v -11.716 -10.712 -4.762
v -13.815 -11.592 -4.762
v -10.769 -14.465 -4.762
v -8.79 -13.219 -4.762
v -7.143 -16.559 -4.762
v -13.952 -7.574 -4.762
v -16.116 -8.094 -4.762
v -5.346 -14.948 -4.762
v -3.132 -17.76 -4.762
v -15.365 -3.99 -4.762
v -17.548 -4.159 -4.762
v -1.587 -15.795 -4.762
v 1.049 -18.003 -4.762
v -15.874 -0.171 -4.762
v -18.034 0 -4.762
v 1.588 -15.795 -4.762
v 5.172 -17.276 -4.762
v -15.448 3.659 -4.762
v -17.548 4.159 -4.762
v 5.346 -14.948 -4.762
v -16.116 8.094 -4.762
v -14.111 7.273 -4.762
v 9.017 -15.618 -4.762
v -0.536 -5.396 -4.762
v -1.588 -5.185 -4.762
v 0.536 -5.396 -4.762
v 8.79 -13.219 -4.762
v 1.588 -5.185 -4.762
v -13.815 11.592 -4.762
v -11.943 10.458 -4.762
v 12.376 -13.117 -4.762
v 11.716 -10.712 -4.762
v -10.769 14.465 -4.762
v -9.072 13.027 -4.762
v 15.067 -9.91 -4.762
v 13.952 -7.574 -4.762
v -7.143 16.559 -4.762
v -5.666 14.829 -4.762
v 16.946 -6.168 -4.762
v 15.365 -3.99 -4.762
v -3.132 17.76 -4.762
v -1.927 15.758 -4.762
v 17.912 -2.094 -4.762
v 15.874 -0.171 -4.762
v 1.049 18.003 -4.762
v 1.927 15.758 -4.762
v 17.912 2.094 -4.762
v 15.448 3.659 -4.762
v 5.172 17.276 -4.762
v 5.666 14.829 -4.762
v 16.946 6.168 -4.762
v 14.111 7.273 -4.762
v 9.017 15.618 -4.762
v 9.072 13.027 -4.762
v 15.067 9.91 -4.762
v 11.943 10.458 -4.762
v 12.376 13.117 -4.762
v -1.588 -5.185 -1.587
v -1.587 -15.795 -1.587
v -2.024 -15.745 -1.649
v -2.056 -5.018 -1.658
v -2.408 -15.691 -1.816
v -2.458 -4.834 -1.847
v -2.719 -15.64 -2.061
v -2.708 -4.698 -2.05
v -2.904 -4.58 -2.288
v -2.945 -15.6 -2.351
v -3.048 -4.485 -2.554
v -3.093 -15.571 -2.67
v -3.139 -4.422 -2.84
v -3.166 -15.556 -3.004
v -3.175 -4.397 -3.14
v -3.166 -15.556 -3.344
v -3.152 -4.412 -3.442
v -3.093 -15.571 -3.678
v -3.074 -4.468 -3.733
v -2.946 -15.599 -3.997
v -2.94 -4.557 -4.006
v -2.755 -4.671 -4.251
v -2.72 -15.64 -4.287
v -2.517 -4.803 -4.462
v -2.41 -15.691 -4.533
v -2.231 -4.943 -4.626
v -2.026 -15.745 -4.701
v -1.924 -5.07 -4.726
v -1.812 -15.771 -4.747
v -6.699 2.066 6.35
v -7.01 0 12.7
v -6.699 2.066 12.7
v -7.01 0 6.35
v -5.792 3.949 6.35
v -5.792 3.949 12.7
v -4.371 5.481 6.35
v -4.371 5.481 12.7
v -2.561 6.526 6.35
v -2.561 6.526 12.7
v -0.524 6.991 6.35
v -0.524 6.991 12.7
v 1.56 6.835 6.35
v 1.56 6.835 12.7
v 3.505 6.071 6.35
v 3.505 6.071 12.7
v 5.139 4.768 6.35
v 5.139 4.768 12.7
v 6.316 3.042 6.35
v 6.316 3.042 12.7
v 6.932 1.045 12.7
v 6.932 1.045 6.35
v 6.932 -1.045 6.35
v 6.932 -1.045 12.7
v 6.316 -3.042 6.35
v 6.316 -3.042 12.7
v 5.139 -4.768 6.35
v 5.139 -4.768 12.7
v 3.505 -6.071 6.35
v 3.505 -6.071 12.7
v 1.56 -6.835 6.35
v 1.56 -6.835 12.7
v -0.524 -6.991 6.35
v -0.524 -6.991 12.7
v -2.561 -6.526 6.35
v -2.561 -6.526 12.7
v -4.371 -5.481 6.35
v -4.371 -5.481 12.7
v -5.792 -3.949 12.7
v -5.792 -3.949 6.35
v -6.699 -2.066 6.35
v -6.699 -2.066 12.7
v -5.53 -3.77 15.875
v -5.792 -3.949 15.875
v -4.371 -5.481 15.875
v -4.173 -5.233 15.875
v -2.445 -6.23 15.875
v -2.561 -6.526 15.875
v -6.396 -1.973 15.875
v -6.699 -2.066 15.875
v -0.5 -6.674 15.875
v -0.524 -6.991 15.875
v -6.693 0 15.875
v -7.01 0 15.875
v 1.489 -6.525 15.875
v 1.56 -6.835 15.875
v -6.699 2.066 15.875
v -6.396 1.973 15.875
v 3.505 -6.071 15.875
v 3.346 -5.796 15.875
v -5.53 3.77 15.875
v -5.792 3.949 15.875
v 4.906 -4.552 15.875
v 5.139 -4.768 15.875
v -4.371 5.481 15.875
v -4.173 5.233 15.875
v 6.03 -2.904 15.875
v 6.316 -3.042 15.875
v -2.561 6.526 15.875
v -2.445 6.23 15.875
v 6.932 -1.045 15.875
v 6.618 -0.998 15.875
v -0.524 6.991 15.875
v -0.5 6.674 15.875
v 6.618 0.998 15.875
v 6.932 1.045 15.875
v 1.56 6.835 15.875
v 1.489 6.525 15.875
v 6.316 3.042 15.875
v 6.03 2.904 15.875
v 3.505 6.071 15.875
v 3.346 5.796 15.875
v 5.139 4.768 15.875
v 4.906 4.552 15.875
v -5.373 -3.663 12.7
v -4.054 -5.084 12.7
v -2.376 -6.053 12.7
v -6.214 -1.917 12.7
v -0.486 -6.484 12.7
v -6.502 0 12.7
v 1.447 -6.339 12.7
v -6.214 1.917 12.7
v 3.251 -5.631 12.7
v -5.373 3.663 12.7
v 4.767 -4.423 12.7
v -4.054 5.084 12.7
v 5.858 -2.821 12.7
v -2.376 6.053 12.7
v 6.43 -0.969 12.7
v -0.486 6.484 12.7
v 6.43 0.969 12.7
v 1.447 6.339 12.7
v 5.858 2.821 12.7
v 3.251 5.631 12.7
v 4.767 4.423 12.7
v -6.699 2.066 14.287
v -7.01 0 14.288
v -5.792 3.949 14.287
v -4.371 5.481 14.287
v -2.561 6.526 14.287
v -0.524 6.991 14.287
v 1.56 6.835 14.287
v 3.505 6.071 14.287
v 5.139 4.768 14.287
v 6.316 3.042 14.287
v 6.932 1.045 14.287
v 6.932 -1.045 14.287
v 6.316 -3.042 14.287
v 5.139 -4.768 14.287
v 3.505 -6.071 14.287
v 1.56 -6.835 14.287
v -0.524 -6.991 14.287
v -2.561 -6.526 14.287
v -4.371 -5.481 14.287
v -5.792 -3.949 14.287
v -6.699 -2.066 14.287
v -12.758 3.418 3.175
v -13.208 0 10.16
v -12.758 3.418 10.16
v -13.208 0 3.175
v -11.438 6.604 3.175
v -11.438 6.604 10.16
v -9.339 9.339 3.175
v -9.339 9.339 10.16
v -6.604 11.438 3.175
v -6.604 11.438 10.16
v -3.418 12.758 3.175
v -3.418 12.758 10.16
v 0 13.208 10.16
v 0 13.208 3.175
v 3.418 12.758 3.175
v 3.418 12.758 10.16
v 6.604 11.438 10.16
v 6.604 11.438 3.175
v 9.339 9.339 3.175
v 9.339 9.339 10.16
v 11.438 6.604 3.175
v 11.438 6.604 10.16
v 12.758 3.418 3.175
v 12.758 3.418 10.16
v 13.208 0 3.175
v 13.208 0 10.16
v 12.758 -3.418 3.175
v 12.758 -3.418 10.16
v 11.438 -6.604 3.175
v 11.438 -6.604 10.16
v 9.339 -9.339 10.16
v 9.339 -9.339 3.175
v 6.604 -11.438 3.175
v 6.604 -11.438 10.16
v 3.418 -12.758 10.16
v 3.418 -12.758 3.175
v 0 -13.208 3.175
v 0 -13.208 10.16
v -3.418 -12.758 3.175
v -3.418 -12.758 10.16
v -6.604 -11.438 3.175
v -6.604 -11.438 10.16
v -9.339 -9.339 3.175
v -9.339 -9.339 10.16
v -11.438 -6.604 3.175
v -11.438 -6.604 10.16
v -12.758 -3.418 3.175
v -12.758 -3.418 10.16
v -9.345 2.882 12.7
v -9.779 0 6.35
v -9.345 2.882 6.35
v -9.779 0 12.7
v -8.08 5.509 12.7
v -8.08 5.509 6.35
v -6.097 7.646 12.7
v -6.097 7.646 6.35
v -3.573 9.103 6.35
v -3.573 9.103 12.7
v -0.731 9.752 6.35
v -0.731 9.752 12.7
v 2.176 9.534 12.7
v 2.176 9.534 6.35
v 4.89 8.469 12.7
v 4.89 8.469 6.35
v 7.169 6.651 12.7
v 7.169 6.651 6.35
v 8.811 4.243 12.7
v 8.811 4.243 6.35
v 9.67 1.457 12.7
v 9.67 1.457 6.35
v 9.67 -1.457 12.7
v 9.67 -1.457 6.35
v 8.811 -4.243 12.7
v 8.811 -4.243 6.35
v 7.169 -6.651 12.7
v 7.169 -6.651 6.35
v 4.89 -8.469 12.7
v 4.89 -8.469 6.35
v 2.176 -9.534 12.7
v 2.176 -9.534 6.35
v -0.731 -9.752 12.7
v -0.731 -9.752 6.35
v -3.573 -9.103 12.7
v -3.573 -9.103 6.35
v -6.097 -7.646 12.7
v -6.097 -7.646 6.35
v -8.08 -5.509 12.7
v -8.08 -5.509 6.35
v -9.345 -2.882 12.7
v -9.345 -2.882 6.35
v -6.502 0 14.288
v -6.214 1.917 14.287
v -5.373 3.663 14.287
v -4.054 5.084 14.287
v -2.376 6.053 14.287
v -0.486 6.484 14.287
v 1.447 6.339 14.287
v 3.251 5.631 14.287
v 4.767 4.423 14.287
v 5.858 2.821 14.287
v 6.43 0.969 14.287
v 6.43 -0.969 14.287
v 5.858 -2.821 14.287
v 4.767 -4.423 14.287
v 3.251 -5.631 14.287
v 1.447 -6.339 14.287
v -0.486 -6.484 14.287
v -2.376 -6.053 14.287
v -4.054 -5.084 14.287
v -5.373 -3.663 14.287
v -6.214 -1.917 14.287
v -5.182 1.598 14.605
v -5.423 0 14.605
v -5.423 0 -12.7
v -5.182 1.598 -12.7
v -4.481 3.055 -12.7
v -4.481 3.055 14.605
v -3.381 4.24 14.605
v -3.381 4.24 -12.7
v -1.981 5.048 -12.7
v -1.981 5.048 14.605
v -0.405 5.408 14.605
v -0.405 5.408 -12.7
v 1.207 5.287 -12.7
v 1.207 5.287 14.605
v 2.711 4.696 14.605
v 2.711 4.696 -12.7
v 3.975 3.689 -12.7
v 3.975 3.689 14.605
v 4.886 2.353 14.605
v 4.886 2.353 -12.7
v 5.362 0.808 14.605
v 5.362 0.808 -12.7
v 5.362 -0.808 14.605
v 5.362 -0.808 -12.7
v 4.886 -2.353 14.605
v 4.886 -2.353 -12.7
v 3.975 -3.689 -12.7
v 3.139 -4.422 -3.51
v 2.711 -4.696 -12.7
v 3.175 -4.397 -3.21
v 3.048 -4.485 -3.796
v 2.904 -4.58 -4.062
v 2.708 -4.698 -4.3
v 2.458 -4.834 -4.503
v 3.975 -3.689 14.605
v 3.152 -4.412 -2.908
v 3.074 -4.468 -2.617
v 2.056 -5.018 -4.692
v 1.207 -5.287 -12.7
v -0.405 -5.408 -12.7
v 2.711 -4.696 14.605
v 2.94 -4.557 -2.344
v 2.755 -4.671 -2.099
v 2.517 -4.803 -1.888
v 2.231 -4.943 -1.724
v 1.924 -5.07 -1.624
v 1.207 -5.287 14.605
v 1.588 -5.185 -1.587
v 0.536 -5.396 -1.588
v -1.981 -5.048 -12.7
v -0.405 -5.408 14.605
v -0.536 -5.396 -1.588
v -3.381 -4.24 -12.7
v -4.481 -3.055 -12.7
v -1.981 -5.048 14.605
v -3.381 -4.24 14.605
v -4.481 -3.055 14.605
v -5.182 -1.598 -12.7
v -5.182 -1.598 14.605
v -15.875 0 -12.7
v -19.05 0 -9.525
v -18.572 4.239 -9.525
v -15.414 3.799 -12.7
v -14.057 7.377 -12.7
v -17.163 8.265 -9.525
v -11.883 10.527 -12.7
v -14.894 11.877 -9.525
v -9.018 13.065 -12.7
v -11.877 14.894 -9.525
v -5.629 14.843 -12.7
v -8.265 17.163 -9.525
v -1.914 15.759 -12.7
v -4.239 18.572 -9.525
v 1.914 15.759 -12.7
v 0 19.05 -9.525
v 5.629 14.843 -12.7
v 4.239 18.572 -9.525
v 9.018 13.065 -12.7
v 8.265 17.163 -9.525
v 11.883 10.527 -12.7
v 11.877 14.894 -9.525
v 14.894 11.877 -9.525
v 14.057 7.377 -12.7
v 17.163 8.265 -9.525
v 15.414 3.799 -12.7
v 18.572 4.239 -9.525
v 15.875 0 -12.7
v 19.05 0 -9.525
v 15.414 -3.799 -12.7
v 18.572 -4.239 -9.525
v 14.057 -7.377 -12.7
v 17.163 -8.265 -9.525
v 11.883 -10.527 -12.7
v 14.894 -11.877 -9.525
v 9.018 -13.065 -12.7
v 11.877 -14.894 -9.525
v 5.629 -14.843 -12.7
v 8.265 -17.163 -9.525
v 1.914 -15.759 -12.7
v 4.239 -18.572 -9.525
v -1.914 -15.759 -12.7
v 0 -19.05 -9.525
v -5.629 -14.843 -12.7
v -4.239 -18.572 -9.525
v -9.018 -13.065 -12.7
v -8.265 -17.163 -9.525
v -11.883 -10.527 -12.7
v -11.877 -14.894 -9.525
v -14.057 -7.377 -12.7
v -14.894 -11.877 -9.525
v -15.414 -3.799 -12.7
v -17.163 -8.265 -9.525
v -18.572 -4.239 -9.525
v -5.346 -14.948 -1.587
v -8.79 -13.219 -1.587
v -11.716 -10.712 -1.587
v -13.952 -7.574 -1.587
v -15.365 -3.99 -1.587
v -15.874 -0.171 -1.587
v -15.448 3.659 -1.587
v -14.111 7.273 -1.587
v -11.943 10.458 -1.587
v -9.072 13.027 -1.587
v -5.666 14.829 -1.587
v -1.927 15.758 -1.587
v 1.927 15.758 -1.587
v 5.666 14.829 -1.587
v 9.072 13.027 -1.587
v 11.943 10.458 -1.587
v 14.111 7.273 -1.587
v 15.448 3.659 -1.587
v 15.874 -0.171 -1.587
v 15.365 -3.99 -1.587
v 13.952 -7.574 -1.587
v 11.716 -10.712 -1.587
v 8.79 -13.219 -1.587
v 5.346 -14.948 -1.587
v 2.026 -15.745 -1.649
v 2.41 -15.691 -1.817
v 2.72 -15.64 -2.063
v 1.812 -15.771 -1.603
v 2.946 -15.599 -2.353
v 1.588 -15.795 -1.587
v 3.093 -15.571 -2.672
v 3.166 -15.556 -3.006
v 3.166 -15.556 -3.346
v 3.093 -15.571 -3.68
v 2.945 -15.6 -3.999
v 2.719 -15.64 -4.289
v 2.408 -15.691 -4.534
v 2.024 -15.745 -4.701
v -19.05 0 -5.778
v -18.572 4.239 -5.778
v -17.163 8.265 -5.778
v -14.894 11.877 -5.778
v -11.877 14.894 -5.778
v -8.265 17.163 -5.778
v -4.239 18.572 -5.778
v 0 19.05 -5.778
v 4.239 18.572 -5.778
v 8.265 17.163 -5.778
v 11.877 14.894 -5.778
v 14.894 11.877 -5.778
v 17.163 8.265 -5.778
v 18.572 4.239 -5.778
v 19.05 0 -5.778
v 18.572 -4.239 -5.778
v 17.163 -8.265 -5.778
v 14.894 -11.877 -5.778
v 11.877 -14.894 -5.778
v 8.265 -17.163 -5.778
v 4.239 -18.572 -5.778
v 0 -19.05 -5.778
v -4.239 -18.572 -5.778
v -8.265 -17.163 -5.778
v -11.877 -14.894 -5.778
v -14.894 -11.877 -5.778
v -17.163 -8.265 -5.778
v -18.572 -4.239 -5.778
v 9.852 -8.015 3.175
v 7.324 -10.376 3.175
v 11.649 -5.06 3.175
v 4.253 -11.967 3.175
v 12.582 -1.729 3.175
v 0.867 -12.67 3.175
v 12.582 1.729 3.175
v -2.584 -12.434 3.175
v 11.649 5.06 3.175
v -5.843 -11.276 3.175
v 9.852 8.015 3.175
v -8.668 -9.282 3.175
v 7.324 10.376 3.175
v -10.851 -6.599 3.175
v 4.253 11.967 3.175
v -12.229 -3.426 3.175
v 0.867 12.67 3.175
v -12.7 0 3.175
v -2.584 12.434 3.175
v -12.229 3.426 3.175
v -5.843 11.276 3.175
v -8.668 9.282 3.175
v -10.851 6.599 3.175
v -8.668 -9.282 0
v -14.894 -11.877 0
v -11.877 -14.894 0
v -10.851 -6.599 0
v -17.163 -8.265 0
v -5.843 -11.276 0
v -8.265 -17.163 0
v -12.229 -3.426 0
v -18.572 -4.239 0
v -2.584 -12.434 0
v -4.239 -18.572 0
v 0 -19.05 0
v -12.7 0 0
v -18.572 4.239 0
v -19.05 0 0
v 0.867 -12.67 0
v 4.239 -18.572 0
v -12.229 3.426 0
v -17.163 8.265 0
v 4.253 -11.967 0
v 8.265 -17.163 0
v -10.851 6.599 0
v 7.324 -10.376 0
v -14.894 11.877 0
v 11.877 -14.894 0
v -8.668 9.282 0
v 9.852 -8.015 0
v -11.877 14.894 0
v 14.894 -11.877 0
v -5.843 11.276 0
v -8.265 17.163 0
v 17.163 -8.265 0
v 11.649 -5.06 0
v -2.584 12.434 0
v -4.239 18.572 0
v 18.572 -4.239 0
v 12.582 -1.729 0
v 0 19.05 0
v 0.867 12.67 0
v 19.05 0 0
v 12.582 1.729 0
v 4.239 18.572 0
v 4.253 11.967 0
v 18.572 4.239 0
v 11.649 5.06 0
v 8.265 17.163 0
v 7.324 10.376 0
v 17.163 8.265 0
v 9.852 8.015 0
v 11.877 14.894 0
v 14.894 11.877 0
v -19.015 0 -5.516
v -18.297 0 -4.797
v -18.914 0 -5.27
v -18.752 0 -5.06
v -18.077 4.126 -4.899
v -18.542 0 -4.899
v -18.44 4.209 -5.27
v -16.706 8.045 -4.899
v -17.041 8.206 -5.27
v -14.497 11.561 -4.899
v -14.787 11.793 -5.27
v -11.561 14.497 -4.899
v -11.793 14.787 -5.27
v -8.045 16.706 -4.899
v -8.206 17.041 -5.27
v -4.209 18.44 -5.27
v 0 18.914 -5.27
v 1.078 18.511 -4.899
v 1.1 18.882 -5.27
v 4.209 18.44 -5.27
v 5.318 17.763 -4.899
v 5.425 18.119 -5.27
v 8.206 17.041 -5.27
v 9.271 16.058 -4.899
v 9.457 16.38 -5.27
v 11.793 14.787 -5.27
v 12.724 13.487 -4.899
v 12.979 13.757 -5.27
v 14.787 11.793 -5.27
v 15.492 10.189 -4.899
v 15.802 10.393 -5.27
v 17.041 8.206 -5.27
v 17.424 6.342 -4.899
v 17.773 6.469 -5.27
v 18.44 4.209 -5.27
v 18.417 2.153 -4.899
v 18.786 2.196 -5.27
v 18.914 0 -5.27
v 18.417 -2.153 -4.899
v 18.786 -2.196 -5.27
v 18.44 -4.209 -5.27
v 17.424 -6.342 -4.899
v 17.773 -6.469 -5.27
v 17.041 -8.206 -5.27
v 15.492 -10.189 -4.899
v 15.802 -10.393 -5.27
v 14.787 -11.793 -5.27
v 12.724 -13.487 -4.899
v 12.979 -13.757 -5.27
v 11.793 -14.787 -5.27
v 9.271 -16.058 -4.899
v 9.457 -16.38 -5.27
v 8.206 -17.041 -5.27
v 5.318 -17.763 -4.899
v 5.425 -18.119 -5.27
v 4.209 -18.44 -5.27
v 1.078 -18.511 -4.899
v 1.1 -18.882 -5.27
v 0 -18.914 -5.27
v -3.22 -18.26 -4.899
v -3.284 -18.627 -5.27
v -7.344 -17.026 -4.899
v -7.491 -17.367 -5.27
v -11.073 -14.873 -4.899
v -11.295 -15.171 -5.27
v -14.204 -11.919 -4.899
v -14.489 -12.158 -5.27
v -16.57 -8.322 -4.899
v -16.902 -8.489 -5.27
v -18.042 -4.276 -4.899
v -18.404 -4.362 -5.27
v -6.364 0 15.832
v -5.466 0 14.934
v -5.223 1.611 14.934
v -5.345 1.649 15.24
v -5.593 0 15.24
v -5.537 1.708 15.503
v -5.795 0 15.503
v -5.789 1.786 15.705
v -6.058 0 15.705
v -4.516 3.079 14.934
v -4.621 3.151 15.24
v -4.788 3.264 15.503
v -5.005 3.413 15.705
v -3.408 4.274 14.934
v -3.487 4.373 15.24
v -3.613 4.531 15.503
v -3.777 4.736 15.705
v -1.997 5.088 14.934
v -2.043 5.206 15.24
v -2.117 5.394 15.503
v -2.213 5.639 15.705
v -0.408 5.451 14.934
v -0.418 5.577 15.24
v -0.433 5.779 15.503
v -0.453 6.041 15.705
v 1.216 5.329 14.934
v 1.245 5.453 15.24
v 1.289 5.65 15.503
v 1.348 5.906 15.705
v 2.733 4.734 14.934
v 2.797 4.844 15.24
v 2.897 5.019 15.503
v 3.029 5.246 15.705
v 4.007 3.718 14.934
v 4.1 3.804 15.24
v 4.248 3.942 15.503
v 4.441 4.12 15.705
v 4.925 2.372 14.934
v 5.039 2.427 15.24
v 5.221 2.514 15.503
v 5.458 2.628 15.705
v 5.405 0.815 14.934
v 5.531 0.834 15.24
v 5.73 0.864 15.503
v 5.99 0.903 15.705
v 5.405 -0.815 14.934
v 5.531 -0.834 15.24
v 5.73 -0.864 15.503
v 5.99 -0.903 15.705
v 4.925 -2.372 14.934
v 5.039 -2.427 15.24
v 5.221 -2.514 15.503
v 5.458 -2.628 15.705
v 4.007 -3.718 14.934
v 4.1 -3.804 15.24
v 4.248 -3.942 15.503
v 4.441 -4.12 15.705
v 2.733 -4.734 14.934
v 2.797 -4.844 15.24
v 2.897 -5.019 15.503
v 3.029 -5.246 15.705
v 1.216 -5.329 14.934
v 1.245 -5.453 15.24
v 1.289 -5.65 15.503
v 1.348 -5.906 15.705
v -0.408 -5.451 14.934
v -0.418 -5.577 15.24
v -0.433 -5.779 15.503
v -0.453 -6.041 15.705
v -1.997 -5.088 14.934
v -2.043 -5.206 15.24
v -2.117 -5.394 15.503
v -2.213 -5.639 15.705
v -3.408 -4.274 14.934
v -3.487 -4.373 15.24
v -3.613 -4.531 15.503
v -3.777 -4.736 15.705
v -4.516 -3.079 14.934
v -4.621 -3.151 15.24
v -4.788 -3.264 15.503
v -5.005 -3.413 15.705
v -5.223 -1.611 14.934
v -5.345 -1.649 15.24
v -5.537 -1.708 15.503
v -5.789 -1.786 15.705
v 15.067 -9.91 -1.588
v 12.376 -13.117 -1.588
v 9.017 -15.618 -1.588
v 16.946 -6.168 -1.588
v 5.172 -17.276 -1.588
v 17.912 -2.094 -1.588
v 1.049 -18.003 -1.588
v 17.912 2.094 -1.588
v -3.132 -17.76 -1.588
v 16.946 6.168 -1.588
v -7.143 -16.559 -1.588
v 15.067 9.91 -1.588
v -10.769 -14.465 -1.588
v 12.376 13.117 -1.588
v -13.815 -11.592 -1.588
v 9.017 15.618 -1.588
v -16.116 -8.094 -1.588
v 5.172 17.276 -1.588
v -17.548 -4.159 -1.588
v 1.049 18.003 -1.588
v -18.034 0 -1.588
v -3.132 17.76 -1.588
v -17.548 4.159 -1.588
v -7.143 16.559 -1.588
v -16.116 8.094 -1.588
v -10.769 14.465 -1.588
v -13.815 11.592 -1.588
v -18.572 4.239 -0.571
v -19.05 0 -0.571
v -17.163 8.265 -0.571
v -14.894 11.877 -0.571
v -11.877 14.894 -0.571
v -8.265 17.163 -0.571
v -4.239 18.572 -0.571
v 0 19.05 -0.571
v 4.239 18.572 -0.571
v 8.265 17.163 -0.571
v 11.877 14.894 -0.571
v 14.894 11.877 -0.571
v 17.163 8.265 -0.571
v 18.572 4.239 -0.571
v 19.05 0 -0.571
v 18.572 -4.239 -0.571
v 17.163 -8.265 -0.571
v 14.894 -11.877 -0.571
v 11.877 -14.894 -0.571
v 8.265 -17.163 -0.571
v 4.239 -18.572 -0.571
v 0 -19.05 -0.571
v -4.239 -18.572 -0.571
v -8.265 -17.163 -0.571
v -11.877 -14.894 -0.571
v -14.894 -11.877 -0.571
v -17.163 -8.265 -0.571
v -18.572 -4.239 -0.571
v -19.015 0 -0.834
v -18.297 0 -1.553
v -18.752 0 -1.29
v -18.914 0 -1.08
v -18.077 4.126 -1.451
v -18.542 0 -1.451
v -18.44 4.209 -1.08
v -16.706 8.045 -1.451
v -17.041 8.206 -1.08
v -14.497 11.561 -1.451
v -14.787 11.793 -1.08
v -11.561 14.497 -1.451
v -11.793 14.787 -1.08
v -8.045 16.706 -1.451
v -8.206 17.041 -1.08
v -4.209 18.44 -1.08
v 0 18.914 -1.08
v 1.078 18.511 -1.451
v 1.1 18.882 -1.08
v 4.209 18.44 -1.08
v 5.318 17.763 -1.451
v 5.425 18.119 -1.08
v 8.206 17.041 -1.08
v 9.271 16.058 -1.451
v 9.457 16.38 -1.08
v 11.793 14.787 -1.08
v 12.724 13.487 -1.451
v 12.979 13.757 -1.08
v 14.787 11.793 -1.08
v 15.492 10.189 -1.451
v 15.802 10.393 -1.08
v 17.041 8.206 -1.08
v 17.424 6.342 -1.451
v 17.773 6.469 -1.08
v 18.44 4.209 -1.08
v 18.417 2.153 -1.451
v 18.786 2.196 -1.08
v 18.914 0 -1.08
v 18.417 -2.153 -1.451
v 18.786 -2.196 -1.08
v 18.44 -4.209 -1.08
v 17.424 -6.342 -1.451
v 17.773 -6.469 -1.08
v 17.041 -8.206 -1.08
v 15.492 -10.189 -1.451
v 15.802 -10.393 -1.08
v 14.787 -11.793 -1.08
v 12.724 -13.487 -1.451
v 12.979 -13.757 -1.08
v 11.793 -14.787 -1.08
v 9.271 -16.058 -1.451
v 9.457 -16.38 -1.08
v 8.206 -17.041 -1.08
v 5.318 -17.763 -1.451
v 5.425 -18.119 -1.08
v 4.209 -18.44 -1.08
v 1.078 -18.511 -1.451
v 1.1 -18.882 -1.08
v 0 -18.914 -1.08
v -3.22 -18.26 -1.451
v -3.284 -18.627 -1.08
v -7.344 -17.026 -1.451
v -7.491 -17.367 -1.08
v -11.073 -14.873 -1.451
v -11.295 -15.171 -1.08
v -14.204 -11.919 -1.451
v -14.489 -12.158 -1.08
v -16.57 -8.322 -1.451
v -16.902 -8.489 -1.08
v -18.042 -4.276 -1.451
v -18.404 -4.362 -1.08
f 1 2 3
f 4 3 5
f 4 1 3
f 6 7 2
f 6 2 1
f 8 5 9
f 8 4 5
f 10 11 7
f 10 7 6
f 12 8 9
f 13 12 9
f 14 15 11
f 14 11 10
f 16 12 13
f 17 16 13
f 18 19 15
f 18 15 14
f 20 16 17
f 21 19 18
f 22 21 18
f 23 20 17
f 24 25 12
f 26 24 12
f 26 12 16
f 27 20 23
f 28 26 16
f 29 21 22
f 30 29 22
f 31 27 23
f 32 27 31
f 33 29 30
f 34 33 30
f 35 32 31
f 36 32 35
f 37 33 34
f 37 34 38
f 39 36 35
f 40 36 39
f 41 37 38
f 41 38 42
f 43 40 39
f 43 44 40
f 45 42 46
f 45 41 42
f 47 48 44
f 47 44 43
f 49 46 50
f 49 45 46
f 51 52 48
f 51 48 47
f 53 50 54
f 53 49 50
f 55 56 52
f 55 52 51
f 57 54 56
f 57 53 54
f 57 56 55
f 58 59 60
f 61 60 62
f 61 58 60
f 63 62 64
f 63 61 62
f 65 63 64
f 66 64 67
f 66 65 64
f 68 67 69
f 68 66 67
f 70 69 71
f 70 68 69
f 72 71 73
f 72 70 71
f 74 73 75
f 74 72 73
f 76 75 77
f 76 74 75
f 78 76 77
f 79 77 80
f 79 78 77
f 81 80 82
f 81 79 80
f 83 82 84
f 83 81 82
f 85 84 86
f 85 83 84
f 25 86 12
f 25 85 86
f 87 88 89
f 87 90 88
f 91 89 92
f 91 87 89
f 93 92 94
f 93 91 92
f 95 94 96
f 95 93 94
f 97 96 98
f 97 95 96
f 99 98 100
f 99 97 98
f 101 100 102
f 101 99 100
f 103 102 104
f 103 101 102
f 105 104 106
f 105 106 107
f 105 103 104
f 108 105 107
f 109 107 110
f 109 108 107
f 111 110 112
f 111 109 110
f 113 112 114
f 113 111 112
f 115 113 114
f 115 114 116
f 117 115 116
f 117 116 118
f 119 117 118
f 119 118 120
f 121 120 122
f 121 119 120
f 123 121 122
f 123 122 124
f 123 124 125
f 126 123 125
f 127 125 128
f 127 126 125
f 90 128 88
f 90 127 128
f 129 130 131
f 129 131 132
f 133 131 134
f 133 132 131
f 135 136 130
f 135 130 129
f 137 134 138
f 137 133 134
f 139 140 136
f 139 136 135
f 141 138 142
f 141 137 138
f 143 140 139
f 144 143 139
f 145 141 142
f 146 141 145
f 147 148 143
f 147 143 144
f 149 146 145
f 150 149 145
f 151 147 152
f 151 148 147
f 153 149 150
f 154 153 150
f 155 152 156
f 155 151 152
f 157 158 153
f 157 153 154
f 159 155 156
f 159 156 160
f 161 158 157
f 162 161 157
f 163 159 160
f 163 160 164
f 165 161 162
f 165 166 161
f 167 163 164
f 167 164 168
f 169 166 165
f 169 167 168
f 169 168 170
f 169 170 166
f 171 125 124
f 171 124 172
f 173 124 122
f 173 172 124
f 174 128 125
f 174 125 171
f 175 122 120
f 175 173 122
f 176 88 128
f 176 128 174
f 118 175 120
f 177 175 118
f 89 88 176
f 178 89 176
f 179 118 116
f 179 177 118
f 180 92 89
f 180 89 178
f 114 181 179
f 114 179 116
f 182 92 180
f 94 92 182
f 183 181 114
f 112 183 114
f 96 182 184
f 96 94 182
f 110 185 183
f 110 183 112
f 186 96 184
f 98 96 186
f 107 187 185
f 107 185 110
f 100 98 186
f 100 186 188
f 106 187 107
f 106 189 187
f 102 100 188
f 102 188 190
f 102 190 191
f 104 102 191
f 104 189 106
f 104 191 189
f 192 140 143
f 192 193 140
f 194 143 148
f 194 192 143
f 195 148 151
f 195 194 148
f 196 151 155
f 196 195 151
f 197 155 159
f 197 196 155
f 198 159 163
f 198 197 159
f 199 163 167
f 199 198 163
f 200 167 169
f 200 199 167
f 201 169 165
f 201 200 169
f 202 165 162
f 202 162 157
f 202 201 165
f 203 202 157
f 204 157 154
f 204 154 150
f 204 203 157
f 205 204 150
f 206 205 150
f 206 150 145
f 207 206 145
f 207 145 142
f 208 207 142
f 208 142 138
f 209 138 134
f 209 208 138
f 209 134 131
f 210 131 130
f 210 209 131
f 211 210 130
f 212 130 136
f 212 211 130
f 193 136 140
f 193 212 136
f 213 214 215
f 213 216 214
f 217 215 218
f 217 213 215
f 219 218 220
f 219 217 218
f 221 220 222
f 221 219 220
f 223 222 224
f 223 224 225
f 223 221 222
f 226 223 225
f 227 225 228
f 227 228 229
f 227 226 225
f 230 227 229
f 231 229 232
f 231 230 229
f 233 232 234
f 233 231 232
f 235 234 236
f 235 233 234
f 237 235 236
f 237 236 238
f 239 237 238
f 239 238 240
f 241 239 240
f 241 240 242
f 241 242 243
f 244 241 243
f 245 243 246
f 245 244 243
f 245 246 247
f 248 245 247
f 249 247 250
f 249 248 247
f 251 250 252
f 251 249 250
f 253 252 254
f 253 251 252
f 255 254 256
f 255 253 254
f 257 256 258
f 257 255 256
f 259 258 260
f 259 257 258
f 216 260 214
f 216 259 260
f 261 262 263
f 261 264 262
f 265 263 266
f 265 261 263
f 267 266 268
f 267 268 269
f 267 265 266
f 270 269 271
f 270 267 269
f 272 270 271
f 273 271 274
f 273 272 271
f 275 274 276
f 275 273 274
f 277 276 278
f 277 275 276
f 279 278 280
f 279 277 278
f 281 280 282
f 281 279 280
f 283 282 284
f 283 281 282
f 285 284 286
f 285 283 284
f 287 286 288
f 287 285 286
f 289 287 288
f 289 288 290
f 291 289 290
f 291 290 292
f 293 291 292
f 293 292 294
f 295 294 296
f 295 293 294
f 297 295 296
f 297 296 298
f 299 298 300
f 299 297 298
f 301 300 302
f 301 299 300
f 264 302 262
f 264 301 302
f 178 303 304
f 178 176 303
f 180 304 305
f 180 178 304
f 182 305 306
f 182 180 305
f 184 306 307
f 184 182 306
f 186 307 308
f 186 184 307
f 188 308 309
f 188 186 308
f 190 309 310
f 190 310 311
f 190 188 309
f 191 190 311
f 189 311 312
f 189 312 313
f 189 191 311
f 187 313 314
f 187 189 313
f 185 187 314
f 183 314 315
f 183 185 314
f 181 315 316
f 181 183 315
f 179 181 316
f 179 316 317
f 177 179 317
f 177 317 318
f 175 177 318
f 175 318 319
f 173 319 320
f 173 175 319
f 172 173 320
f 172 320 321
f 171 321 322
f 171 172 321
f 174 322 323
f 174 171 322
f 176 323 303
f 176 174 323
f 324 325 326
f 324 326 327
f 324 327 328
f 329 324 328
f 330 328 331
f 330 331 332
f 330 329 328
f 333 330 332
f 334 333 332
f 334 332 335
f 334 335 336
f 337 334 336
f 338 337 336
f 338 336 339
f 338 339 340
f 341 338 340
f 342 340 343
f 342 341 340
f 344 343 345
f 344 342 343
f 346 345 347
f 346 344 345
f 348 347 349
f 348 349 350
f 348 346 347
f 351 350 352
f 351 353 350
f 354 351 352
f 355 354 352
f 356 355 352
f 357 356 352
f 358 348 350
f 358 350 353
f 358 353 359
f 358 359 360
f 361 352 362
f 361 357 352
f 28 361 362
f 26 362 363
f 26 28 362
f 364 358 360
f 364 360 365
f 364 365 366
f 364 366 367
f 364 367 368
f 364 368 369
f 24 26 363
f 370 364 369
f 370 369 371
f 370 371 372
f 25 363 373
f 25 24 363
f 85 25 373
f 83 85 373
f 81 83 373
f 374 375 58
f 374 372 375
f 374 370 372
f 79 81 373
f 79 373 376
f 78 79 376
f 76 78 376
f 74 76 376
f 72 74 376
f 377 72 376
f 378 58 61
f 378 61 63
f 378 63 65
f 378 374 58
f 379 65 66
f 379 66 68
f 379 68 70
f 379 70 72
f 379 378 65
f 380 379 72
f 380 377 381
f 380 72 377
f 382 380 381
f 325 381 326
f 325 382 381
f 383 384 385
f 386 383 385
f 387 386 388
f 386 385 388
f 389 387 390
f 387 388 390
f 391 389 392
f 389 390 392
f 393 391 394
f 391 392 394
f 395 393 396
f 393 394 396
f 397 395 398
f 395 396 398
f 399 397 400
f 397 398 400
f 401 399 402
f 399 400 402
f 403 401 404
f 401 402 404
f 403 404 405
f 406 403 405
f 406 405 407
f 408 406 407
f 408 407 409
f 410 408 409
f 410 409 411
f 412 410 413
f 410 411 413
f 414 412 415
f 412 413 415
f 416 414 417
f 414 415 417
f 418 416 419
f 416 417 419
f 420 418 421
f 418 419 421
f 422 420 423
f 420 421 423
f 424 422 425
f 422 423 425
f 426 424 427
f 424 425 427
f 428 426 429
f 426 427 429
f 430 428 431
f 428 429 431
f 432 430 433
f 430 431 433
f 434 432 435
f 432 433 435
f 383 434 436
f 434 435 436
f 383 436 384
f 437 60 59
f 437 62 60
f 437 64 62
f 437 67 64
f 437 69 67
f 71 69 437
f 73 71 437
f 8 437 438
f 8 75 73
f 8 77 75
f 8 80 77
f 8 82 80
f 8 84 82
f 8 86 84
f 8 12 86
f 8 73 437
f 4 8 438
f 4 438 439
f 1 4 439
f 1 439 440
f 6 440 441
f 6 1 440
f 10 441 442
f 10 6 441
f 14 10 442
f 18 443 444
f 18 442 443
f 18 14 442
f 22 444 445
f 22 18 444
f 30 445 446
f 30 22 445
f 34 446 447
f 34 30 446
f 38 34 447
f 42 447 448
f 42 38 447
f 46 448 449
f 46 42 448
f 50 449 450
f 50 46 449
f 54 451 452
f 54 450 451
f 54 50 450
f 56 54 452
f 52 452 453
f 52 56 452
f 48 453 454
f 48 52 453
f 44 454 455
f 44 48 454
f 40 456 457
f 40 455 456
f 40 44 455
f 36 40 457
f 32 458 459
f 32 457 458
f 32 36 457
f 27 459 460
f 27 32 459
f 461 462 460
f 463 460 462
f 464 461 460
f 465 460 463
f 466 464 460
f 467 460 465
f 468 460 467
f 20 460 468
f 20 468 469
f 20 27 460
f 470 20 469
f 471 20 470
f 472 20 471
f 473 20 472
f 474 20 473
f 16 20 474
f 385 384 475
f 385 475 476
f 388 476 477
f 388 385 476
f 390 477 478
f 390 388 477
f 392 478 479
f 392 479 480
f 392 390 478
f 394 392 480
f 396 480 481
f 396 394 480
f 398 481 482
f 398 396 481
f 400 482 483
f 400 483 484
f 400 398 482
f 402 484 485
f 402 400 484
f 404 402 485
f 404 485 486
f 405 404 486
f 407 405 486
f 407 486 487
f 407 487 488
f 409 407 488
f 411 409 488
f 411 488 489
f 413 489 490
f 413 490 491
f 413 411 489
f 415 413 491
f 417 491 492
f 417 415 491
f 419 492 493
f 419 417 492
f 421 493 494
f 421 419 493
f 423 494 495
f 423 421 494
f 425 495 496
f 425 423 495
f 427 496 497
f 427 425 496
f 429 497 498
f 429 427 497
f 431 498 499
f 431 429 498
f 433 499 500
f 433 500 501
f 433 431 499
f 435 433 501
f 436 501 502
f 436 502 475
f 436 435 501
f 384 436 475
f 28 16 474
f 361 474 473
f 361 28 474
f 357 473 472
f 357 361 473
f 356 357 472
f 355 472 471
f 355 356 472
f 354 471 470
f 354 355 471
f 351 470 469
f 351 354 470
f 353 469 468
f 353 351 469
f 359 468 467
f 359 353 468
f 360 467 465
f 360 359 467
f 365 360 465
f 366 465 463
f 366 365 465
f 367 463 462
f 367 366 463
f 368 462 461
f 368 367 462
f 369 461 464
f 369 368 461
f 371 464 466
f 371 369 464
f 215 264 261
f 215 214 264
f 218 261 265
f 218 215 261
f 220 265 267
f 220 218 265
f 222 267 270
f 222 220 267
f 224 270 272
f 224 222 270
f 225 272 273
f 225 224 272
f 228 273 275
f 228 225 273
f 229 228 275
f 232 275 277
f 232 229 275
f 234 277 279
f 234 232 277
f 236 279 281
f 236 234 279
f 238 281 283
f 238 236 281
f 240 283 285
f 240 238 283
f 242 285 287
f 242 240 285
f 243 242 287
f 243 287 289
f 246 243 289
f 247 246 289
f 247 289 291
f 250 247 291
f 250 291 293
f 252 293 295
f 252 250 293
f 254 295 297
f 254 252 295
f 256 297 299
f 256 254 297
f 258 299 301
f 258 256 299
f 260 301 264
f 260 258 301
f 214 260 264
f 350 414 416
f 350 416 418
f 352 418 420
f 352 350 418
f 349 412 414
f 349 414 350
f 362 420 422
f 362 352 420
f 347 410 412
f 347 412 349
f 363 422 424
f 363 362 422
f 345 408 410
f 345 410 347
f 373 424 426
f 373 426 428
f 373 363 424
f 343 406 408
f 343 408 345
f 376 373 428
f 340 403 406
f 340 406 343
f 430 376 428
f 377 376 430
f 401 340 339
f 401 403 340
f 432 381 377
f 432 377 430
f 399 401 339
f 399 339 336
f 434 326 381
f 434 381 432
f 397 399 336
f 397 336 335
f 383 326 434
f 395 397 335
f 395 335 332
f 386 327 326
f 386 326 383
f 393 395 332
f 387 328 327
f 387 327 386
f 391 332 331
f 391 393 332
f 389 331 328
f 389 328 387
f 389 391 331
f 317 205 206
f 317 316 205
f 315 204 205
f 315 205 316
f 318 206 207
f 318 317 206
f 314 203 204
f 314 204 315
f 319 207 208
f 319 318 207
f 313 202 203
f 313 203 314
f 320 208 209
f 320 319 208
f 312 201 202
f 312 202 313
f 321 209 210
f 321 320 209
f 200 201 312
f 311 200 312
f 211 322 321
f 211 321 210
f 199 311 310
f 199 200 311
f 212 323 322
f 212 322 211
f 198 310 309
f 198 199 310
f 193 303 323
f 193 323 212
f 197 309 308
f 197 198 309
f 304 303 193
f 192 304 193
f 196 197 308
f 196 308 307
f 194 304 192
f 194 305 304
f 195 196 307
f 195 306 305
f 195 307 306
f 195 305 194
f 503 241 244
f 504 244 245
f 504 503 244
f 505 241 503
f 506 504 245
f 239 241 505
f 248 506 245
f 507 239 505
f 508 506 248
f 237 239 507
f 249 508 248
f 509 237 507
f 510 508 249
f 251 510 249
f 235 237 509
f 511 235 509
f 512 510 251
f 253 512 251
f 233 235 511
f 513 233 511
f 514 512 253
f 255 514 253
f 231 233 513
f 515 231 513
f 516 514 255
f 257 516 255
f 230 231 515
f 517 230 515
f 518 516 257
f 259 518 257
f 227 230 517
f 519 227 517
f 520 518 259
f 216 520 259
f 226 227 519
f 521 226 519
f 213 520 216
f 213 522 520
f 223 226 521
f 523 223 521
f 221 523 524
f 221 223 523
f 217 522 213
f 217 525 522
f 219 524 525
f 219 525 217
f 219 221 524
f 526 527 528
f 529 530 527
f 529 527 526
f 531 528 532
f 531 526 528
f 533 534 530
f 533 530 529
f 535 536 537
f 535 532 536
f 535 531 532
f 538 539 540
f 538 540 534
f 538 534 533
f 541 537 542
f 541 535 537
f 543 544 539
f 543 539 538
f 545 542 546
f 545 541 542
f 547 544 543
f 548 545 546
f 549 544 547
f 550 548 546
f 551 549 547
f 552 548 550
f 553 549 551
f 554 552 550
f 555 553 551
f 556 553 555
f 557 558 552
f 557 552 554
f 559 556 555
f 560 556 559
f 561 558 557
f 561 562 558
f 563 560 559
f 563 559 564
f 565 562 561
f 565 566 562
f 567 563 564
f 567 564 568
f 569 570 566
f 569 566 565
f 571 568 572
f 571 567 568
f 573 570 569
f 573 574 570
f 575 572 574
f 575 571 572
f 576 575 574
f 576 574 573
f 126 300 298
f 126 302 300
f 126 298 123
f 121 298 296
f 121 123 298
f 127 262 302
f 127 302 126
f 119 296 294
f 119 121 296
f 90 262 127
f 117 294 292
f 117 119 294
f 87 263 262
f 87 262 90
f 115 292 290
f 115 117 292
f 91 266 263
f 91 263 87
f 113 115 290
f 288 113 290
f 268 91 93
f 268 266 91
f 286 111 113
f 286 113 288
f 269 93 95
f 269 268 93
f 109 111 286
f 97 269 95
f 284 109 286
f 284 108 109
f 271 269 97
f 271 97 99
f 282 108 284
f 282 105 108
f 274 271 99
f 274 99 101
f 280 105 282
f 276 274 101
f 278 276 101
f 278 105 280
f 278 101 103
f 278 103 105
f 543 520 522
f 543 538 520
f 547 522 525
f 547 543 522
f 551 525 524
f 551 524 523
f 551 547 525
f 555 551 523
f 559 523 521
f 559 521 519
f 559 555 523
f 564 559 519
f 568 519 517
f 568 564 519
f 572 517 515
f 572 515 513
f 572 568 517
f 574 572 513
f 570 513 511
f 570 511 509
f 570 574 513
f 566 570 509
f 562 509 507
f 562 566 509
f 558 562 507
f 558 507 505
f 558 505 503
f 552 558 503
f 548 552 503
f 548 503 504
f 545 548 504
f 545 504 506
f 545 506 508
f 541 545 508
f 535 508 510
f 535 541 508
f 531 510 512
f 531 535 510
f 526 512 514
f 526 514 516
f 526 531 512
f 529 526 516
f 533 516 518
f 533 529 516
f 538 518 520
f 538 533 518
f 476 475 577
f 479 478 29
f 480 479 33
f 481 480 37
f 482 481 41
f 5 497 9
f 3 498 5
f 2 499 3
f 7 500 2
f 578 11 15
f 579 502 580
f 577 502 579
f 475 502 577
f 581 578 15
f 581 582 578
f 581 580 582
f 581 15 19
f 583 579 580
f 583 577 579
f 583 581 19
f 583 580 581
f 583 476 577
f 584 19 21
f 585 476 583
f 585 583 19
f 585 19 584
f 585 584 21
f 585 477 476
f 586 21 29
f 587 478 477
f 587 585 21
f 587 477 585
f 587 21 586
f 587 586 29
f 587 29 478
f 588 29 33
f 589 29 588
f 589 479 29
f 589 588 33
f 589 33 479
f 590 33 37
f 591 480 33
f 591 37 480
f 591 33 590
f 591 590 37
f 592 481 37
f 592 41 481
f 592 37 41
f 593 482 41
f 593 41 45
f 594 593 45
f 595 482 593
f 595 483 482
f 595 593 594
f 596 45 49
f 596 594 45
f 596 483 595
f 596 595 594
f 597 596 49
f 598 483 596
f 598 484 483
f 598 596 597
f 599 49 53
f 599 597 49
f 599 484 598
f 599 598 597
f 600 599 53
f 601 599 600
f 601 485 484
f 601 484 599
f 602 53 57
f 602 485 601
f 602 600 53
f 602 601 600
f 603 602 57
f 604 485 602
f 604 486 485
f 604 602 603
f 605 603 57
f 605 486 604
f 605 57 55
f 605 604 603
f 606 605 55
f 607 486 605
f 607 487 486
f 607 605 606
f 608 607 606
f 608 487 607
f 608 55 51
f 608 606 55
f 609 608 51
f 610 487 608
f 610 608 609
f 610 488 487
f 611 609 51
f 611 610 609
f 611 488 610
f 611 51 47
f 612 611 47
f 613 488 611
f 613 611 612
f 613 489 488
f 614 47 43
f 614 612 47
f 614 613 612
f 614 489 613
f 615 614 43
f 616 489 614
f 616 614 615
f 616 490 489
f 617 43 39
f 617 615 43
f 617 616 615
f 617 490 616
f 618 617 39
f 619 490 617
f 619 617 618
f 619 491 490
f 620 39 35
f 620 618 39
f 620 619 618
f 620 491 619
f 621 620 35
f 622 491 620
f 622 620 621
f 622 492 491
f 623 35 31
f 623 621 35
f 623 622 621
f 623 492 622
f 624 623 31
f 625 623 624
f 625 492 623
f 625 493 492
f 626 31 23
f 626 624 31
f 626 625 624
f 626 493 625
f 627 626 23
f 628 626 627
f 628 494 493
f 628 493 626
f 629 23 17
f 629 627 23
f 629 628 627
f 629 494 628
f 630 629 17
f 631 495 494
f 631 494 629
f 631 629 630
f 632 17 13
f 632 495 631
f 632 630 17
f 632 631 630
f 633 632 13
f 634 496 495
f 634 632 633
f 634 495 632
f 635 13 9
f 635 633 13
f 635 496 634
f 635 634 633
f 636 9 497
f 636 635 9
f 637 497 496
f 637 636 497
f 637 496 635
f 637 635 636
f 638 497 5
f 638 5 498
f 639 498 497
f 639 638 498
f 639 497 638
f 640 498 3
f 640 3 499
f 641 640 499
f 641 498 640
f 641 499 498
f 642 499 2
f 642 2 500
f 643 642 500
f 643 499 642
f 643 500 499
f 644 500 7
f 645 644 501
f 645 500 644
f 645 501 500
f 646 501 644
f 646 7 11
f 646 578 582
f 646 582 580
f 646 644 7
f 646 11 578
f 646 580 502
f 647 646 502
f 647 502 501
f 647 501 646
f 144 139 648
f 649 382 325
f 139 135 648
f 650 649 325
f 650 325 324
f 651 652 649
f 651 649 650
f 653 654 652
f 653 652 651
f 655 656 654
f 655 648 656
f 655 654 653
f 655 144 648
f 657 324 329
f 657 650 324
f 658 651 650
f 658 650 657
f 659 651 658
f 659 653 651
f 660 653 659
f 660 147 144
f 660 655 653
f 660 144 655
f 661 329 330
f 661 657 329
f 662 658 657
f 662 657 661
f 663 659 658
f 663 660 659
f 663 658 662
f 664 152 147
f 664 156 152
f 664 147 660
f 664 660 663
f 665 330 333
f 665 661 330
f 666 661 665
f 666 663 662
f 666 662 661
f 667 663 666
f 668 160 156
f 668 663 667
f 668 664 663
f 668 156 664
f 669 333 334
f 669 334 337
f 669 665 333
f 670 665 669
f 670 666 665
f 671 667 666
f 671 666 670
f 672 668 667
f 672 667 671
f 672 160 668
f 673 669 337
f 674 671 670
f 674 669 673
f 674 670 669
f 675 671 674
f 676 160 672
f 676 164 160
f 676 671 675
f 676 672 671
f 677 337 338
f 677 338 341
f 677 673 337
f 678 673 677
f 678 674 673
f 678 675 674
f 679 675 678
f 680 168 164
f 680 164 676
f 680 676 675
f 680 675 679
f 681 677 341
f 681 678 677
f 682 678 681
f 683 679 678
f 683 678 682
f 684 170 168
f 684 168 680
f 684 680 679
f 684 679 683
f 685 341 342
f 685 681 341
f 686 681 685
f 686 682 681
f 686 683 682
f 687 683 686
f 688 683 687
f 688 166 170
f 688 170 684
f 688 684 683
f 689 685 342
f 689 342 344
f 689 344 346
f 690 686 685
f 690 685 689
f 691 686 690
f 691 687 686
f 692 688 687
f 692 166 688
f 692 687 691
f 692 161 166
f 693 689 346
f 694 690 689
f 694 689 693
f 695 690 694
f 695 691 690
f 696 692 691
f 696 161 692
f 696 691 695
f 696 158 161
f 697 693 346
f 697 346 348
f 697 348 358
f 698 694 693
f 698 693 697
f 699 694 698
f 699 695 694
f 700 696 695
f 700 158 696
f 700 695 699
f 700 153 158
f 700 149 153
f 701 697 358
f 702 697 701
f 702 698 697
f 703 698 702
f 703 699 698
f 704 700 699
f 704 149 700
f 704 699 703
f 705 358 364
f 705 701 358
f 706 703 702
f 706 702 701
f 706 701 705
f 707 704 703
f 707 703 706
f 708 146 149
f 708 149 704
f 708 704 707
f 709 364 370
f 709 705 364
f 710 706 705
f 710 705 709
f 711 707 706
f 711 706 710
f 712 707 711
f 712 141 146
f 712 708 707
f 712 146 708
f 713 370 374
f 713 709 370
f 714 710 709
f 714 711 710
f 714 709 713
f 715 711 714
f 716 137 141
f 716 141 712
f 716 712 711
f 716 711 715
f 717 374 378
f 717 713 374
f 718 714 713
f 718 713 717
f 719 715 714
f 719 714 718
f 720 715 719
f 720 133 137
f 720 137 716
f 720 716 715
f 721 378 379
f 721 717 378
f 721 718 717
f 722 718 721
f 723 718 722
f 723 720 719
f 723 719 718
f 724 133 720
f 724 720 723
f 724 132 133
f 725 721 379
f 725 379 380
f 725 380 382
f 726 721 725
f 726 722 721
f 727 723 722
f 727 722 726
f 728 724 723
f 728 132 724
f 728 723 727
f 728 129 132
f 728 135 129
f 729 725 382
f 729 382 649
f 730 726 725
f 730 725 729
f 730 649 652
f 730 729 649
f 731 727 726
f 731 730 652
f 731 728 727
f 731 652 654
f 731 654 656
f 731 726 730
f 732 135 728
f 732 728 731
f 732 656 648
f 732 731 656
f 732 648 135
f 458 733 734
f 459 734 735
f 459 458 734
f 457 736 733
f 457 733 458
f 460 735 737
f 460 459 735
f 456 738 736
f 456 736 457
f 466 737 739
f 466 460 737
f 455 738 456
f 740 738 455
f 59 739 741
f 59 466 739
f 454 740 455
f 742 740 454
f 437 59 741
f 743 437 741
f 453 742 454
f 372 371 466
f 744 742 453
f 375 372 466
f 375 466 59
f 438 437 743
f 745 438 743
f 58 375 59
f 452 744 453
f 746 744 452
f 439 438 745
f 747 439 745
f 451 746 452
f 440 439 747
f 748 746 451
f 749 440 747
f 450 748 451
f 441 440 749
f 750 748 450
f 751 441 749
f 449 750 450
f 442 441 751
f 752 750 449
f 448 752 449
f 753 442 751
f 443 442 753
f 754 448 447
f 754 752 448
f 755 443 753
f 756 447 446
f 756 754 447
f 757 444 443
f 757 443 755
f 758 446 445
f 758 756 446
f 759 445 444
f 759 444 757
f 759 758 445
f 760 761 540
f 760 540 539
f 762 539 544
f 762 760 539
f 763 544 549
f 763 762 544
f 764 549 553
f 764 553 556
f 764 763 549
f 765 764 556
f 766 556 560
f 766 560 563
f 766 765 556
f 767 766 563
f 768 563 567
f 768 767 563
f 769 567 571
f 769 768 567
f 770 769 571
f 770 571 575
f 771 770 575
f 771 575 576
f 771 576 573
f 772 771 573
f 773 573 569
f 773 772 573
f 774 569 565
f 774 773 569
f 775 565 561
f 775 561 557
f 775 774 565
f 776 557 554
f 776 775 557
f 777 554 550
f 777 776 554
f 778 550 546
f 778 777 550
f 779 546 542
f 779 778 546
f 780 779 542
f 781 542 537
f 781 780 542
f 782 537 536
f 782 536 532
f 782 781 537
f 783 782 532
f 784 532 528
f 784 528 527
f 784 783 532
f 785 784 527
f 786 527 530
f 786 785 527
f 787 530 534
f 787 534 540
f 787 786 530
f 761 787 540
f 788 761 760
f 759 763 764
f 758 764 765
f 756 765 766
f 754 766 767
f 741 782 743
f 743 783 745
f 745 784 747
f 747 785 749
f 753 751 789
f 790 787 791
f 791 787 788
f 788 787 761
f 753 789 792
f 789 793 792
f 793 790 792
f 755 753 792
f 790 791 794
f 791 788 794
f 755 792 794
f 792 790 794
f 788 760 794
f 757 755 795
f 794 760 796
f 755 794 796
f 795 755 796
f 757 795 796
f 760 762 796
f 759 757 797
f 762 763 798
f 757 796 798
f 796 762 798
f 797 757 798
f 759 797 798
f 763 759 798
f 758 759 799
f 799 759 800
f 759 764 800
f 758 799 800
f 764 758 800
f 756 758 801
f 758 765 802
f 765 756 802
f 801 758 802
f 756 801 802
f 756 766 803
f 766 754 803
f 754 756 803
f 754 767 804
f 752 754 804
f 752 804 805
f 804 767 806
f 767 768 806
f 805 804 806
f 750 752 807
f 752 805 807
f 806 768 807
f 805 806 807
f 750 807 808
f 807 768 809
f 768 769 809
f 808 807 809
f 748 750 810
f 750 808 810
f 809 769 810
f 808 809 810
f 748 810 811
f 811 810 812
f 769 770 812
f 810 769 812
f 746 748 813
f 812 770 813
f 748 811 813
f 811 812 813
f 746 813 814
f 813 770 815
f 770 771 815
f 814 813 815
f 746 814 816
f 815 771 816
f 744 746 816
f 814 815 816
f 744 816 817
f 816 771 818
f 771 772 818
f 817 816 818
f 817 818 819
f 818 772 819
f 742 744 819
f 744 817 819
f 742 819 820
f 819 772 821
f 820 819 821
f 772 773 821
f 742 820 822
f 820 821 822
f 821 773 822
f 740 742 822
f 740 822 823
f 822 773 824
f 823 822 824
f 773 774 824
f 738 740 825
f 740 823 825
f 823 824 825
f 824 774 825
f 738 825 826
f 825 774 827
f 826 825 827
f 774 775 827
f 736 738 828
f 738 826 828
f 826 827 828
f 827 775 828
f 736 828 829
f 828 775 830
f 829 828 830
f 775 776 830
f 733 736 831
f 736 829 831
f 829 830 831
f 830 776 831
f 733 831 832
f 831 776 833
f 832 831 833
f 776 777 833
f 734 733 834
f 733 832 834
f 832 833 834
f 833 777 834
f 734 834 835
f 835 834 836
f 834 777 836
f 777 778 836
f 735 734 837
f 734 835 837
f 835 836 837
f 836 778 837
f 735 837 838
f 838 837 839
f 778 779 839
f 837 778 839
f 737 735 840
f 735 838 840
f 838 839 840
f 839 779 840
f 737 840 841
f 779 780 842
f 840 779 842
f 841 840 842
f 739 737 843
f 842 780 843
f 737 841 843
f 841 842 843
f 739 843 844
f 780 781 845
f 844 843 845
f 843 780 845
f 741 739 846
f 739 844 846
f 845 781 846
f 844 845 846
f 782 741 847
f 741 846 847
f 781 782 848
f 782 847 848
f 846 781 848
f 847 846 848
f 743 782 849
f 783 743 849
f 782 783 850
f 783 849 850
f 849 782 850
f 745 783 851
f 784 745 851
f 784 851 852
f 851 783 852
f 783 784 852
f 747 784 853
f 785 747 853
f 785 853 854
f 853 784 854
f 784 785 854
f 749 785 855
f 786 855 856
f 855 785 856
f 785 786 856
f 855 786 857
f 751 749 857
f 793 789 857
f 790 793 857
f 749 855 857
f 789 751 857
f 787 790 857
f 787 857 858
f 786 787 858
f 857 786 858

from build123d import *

# Parameters (mm, degrees)
F2_SIZE  = 3.175
F4_DEPTH = 25.4
F5_R     = 1.016
F6_R     = 1.27


with BuildPart() as f1:
    # F0 (on Front) → F1 (revolve)
    with BuildSketch(Plane.XZ):
        Polygon((-19.05, -12.7), (-5.4229, -12.7), (-5.4229, 15.875), (-7.0104, 15.875), (-7.0104, 14.2875), (-6.5024, 14.2875), (-6.5024, 12.7), (-7.0104, 12.7), (-7.0104, 6.35), (-9.779, 6.35), (-9.779, 12.7), (-13.208, 10.16), (-13.208, 6.35), (-13.208, 3.175), (-12.7, 3.175), (-12.7, 0), (-19.05, 0), (-19.05, -1.5875), (-15.875, -1.5875), (-15.875, -4.7625), (-19.05, -4.7625), align=None)
    revolve(axis=Axis((0, 0, 5.660842), (0, 0, -1)))

    # F2
    f2_edges = [f1.edges().sort_by_distance(p)[0] for p in [
        (19.05, 0, -12.7),
    ]]
    chamfer(f2_edges, length=F2_SIZE)

    # F3 (on Front) → F4 (cut)
    with BuildSketch(Plane.XZ):
        with BuildLine():
            ThreePointArc((1.5875, -4.7625), (3.175, -3.175), (1.5875, -1.5875))
            Line((1.5875, -1.5875), (-1.5875, -1.5875))
            ThreePointArc((-1.5875, -1.5875), (-3.175, -3.175), (-1.5875, -4.7625))
            Line((-1.5875, -4.7625), (1.5875, -4.7625))
        make_face()
    extrude(amount=F4_DEPTH, mode=Mode.SUBTRACT)

    # F5
    f5_edges = [f1.edges().sort_by_distance(p)[0] for p in [
        (19.05, 0, -1.5875),
        (19.05, 0, -4.7625),
    ]]
    fillet(f5_edges, radius=F5_R)

    # F6
    f6_edges = [f1.edges().sort_by_distance(p)[0] for p in [
        (5.4229, 0, 15.875),
    ]]
    fillet(f6_edges, radius=F6_R)


solid = f1.part
